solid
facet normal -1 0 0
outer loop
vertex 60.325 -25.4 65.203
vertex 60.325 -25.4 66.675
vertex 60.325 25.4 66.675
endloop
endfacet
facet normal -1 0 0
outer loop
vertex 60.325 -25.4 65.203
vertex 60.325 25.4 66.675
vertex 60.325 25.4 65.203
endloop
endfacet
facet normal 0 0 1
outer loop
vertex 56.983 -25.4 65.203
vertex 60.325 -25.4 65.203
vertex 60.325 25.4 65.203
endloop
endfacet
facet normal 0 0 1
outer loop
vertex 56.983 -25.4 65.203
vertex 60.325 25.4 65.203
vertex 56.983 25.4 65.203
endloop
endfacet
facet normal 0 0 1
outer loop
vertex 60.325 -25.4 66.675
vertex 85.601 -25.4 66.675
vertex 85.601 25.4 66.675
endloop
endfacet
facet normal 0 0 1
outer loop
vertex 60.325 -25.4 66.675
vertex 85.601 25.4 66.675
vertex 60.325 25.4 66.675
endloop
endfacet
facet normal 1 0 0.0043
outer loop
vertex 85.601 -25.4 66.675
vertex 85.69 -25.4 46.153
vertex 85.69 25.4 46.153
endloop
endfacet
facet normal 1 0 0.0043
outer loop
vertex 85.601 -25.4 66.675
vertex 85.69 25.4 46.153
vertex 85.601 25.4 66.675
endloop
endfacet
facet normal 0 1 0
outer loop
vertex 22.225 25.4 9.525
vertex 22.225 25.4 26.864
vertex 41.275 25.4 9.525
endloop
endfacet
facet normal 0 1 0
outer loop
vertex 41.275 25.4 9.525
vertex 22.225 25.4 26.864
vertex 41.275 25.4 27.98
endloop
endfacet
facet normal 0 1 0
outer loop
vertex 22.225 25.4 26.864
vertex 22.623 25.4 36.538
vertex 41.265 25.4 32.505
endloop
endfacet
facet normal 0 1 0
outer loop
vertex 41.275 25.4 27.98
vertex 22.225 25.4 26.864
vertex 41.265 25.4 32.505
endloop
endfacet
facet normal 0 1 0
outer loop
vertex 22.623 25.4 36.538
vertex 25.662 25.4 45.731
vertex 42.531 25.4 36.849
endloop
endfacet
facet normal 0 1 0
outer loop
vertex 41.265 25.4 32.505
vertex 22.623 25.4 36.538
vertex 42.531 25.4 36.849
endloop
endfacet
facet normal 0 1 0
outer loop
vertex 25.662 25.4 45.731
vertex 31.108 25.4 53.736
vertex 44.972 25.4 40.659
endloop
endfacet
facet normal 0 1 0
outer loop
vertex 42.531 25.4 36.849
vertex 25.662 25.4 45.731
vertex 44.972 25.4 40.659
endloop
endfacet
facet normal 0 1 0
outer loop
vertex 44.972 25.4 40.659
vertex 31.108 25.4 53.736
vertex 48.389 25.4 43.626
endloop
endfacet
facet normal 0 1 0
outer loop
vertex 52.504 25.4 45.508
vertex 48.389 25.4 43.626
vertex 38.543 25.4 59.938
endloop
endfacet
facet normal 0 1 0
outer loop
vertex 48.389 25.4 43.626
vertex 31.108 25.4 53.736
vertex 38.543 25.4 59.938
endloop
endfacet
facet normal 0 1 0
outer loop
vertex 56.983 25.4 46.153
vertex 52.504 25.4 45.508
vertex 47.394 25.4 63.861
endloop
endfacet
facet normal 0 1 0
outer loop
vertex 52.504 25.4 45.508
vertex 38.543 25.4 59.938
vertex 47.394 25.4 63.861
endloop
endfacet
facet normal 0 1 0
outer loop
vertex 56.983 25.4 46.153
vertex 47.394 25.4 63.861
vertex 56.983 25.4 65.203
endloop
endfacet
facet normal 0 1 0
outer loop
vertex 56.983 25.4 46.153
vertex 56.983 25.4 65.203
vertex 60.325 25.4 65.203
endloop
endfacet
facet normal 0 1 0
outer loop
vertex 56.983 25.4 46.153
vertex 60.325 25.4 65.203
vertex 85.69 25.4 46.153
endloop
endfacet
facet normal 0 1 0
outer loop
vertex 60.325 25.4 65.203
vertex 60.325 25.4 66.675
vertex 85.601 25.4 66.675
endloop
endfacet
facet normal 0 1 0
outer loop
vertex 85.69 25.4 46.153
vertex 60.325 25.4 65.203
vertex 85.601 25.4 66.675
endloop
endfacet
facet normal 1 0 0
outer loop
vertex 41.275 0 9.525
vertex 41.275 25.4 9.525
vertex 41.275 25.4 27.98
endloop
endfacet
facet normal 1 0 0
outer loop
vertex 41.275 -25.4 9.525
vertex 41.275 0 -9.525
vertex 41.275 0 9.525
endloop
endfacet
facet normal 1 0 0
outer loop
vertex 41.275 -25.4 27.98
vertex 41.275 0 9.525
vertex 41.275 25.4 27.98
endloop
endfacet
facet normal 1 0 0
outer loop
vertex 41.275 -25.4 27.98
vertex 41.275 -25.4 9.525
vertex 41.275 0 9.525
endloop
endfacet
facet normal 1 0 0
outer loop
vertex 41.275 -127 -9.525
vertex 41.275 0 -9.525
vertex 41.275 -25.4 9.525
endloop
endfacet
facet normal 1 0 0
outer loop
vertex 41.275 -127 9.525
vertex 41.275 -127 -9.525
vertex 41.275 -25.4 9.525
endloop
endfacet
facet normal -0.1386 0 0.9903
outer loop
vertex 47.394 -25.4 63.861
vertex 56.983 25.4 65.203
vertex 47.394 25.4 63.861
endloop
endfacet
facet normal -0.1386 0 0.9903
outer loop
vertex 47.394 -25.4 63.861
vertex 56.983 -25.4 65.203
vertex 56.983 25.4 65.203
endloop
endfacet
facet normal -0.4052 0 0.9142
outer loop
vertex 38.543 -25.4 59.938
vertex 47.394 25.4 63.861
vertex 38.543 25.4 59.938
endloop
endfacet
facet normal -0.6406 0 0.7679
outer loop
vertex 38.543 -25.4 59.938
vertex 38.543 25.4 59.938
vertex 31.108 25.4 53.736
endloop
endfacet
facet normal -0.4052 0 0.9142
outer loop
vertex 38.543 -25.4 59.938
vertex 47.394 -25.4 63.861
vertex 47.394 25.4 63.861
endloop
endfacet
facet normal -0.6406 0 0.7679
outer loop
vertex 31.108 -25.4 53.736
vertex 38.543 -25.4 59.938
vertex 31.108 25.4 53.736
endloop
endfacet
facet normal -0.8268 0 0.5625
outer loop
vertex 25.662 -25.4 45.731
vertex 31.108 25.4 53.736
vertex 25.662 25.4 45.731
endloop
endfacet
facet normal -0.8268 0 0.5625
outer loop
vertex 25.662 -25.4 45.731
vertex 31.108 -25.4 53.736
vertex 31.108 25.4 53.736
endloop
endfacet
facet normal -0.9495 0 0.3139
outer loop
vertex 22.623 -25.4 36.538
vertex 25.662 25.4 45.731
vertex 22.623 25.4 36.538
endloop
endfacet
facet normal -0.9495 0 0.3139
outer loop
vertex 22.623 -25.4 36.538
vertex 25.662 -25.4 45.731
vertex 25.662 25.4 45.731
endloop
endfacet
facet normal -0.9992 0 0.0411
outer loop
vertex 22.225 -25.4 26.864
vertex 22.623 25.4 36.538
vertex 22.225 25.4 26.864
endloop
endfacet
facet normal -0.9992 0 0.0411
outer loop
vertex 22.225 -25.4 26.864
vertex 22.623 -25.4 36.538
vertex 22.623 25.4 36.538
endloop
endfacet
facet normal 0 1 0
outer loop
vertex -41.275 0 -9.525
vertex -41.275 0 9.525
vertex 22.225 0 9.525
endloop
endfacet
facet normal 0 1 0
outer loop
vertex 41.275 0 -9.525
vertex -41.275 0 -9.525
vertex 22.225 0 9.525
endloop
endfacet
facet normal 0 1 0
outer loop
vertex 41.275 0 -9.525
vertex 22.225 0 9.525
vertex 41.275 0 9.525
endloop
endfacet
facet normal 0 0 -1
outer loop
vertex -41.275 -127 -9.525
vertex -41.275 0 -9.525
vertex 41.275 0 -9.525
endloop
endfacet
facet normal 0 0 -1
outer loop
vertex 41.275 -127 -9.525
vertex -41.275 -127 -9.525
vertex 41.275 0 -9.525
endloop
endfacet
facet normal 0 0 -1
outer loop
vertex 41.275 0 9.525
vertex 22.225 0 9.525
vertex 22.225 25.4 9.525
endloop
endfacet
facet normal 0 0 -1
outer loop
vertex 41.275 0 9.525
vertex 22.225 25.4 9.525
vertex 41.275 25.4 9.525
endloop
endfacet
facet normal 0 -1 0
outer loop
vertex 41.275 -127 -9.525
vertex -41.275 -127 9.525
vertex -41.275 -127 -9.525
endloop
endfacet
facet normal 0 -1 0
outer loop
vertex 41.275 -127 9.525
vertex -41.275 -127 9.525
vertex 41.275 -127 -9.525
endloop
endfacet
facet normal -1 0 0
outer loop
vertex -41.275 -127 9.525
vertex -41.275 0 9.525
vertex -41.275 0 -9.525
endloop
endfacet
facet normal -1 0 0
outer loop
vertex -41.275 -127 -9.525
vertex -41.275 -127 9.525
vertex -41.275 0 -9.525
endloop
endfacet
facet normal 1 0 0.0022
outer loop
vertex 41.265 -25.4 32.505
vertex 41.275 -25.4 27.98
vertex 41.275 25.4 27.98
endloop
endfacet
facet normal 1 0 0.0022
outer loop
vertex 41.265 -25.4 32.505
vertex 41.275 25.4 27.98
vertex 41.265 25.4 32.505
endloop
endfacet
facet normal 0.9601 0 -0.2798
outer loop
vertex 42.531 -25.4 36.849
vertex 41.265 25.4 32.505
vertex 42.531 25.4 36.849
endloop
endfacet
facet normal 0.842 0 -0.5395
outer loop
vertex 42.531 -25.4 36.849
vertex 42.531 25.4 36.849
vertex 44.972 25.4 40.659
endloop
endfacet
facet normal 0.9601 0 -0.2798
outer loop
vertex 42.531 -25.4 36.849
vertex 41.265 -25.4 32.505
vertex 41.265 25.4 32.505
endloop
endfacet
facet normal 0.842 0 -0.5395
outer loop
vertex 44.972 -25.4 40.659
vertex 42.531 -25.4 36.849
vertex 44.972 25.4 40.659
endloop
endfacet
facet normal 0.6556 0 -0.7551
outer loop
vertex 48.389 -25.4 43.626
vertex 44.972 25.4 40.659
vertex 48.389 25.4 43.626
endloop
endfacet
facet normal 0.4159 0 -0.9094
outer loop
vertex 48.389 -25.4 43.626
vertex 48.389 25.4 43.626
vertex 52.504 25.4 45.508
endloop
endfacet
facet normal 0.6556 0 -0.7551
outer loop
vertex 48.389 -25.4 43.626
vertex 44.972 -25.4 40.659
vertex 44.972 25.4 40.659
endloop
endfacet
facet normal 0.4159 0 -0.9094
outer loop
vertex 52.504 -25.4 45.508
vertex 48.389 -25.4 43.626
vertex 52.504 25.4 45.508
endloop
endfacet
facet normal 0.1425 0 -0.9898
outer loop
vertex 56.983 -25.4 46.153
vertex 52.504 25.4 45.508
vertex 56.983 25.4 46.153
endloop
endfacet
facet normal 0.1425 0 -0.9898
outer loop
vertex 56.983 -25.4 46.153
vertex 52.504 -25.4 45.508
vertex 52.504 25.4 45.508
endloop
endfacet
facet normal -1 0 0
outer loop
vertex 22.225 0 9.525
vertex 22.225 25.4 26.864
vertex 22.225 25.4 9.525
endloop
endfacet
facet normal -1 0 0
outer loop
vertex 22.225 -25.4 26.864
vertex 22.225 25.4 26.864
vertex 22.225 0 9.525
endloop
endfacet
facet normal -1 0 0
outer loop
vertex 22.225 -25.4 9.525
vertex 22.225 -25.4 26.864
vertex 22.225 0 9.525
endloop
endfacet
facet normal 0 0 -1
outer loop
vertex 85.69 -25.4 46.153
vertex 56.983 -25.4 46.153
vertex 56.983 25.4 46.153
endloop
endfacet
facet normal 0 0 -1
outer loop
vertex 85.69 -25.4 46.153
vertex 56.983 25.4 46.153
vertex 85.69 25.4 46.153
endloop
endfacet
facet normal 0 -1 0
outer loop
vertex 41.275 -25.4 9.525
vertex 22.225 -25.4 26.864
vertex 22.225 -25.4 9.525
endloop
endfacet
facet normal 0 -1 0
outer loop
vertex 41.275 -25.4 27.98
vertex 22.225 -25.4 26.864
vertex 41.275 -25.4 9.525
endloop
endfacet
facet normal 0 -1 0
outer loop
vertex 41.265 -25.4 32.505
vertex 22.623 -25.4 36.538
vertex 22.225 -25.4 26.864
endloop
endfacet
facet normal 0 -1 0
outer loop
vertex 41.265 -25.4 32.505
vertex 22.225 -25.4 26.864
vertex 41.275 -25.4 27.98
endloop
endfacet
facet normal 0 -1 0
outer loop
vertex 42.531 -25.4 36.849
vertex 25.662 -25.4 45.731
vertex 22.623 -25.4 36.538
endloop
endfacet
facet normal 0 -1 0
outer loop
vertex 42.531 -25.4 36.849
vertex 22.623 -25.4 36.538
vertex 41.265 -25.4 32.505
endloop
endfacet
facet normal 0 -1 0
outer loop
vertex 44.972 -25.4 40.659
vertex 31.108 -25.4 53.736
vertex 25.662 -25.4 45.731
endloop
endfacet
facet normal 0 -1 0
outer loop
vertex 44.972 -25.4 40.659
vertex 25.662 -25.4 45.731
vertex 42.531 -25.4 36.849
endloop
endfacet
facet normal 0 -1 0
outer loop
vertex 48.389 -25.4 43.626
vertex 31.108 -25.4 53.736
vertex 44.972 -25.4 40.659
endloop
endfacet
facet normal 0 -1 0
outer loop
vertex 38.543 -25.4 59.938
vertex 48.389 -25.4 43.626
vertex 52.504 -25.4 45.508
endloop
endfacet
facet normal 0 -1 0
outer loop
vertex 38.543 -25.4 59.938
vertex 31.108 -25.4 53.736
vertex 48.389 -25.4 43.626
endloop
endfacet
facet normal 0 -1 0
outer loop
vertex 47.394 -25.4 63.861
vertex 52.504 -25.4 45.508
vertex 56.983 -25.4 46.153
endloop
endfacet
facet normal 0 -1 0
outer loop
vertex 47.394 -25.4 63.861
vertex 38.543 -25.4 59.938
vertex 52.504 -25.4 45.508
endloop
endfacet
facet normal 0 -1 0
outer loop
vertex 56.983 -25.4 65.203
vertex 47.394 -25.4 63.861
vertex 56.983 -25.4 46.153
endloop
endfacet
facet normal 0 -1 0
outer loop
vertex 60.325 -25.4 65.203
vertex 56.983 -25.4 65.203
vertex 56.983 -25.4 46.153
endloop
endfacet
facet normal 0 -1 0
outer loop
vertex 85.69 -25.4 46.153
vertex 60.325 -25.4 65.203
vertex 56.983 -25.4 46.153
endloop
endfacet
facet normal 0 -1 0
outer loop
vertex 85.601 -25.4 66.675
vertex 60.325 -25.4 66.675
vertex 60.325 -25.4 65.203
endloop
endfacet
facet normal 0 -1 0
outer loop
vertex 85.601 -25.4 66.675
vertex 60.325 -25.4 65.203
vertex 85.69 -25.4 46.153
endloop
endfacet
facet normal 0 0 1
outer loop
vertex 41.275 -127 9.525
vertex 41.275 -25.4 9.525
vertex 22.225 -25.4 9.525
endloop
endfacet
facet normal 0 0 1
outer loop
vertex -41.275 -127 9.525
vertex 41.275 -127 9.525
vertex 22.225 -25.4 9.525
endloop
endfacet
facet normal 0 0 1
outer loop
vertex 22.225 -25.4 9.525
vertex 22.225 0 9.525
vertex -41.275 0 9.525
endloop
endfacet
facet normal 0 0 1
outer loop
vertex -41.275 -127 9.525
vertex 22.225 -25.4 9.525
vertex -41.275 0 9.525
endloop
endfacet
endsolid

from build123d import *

# Parameters (mm, degrees)
F1_DEPTH = 127
F2_DEPTH = 25.4


with BuildPart() as f1:
    # F0 (on Front) → F1 (new body)
    with BuildSketch(Plane.XZ):
        Polygon((41.275, -9.525), (41.275, 9.525), (22.225, 9.525), (-41.275, 9.525), (-41.275, -9.525), align=None)
    extrude(amount=F1_DEPTH)

    # F0 (on Front) → F2 (join, symmetric)
    with BuildSketch(Plane.XZ):
        with BuildLine():
            Line((22.225, 9.525), (41.275, 9.525))
            Line((41.275, 9.525), (41.275, 27.979645))
            ThreePointArc((41.275, 27.979645), (44.97222, 40.659064), (56.982722, 46.153145))
            Line((56.982722, 46.153145), (60.325, 46.153145))
            Line((60.325, 46.153145), (60.325, 65.203145))
            Line((60.325, 65.203145), (56.982722, 65.203145))
            ThreePointArc((56.982722, 65.203145), (31.108074, 53.735729), (22.225, 26.863997))
            Line((22.225, 26.863997), (22.225, 9.525))
        make_face()
        Polygon((60.325, 65.203145), (60.325, 46.153145), (85.689964, 46.153145), (85.600682, 66.675), (60.325, 66.675), align=None)
    extrude(amount=F2_DEPTH, both=True)


solid = f1.part
